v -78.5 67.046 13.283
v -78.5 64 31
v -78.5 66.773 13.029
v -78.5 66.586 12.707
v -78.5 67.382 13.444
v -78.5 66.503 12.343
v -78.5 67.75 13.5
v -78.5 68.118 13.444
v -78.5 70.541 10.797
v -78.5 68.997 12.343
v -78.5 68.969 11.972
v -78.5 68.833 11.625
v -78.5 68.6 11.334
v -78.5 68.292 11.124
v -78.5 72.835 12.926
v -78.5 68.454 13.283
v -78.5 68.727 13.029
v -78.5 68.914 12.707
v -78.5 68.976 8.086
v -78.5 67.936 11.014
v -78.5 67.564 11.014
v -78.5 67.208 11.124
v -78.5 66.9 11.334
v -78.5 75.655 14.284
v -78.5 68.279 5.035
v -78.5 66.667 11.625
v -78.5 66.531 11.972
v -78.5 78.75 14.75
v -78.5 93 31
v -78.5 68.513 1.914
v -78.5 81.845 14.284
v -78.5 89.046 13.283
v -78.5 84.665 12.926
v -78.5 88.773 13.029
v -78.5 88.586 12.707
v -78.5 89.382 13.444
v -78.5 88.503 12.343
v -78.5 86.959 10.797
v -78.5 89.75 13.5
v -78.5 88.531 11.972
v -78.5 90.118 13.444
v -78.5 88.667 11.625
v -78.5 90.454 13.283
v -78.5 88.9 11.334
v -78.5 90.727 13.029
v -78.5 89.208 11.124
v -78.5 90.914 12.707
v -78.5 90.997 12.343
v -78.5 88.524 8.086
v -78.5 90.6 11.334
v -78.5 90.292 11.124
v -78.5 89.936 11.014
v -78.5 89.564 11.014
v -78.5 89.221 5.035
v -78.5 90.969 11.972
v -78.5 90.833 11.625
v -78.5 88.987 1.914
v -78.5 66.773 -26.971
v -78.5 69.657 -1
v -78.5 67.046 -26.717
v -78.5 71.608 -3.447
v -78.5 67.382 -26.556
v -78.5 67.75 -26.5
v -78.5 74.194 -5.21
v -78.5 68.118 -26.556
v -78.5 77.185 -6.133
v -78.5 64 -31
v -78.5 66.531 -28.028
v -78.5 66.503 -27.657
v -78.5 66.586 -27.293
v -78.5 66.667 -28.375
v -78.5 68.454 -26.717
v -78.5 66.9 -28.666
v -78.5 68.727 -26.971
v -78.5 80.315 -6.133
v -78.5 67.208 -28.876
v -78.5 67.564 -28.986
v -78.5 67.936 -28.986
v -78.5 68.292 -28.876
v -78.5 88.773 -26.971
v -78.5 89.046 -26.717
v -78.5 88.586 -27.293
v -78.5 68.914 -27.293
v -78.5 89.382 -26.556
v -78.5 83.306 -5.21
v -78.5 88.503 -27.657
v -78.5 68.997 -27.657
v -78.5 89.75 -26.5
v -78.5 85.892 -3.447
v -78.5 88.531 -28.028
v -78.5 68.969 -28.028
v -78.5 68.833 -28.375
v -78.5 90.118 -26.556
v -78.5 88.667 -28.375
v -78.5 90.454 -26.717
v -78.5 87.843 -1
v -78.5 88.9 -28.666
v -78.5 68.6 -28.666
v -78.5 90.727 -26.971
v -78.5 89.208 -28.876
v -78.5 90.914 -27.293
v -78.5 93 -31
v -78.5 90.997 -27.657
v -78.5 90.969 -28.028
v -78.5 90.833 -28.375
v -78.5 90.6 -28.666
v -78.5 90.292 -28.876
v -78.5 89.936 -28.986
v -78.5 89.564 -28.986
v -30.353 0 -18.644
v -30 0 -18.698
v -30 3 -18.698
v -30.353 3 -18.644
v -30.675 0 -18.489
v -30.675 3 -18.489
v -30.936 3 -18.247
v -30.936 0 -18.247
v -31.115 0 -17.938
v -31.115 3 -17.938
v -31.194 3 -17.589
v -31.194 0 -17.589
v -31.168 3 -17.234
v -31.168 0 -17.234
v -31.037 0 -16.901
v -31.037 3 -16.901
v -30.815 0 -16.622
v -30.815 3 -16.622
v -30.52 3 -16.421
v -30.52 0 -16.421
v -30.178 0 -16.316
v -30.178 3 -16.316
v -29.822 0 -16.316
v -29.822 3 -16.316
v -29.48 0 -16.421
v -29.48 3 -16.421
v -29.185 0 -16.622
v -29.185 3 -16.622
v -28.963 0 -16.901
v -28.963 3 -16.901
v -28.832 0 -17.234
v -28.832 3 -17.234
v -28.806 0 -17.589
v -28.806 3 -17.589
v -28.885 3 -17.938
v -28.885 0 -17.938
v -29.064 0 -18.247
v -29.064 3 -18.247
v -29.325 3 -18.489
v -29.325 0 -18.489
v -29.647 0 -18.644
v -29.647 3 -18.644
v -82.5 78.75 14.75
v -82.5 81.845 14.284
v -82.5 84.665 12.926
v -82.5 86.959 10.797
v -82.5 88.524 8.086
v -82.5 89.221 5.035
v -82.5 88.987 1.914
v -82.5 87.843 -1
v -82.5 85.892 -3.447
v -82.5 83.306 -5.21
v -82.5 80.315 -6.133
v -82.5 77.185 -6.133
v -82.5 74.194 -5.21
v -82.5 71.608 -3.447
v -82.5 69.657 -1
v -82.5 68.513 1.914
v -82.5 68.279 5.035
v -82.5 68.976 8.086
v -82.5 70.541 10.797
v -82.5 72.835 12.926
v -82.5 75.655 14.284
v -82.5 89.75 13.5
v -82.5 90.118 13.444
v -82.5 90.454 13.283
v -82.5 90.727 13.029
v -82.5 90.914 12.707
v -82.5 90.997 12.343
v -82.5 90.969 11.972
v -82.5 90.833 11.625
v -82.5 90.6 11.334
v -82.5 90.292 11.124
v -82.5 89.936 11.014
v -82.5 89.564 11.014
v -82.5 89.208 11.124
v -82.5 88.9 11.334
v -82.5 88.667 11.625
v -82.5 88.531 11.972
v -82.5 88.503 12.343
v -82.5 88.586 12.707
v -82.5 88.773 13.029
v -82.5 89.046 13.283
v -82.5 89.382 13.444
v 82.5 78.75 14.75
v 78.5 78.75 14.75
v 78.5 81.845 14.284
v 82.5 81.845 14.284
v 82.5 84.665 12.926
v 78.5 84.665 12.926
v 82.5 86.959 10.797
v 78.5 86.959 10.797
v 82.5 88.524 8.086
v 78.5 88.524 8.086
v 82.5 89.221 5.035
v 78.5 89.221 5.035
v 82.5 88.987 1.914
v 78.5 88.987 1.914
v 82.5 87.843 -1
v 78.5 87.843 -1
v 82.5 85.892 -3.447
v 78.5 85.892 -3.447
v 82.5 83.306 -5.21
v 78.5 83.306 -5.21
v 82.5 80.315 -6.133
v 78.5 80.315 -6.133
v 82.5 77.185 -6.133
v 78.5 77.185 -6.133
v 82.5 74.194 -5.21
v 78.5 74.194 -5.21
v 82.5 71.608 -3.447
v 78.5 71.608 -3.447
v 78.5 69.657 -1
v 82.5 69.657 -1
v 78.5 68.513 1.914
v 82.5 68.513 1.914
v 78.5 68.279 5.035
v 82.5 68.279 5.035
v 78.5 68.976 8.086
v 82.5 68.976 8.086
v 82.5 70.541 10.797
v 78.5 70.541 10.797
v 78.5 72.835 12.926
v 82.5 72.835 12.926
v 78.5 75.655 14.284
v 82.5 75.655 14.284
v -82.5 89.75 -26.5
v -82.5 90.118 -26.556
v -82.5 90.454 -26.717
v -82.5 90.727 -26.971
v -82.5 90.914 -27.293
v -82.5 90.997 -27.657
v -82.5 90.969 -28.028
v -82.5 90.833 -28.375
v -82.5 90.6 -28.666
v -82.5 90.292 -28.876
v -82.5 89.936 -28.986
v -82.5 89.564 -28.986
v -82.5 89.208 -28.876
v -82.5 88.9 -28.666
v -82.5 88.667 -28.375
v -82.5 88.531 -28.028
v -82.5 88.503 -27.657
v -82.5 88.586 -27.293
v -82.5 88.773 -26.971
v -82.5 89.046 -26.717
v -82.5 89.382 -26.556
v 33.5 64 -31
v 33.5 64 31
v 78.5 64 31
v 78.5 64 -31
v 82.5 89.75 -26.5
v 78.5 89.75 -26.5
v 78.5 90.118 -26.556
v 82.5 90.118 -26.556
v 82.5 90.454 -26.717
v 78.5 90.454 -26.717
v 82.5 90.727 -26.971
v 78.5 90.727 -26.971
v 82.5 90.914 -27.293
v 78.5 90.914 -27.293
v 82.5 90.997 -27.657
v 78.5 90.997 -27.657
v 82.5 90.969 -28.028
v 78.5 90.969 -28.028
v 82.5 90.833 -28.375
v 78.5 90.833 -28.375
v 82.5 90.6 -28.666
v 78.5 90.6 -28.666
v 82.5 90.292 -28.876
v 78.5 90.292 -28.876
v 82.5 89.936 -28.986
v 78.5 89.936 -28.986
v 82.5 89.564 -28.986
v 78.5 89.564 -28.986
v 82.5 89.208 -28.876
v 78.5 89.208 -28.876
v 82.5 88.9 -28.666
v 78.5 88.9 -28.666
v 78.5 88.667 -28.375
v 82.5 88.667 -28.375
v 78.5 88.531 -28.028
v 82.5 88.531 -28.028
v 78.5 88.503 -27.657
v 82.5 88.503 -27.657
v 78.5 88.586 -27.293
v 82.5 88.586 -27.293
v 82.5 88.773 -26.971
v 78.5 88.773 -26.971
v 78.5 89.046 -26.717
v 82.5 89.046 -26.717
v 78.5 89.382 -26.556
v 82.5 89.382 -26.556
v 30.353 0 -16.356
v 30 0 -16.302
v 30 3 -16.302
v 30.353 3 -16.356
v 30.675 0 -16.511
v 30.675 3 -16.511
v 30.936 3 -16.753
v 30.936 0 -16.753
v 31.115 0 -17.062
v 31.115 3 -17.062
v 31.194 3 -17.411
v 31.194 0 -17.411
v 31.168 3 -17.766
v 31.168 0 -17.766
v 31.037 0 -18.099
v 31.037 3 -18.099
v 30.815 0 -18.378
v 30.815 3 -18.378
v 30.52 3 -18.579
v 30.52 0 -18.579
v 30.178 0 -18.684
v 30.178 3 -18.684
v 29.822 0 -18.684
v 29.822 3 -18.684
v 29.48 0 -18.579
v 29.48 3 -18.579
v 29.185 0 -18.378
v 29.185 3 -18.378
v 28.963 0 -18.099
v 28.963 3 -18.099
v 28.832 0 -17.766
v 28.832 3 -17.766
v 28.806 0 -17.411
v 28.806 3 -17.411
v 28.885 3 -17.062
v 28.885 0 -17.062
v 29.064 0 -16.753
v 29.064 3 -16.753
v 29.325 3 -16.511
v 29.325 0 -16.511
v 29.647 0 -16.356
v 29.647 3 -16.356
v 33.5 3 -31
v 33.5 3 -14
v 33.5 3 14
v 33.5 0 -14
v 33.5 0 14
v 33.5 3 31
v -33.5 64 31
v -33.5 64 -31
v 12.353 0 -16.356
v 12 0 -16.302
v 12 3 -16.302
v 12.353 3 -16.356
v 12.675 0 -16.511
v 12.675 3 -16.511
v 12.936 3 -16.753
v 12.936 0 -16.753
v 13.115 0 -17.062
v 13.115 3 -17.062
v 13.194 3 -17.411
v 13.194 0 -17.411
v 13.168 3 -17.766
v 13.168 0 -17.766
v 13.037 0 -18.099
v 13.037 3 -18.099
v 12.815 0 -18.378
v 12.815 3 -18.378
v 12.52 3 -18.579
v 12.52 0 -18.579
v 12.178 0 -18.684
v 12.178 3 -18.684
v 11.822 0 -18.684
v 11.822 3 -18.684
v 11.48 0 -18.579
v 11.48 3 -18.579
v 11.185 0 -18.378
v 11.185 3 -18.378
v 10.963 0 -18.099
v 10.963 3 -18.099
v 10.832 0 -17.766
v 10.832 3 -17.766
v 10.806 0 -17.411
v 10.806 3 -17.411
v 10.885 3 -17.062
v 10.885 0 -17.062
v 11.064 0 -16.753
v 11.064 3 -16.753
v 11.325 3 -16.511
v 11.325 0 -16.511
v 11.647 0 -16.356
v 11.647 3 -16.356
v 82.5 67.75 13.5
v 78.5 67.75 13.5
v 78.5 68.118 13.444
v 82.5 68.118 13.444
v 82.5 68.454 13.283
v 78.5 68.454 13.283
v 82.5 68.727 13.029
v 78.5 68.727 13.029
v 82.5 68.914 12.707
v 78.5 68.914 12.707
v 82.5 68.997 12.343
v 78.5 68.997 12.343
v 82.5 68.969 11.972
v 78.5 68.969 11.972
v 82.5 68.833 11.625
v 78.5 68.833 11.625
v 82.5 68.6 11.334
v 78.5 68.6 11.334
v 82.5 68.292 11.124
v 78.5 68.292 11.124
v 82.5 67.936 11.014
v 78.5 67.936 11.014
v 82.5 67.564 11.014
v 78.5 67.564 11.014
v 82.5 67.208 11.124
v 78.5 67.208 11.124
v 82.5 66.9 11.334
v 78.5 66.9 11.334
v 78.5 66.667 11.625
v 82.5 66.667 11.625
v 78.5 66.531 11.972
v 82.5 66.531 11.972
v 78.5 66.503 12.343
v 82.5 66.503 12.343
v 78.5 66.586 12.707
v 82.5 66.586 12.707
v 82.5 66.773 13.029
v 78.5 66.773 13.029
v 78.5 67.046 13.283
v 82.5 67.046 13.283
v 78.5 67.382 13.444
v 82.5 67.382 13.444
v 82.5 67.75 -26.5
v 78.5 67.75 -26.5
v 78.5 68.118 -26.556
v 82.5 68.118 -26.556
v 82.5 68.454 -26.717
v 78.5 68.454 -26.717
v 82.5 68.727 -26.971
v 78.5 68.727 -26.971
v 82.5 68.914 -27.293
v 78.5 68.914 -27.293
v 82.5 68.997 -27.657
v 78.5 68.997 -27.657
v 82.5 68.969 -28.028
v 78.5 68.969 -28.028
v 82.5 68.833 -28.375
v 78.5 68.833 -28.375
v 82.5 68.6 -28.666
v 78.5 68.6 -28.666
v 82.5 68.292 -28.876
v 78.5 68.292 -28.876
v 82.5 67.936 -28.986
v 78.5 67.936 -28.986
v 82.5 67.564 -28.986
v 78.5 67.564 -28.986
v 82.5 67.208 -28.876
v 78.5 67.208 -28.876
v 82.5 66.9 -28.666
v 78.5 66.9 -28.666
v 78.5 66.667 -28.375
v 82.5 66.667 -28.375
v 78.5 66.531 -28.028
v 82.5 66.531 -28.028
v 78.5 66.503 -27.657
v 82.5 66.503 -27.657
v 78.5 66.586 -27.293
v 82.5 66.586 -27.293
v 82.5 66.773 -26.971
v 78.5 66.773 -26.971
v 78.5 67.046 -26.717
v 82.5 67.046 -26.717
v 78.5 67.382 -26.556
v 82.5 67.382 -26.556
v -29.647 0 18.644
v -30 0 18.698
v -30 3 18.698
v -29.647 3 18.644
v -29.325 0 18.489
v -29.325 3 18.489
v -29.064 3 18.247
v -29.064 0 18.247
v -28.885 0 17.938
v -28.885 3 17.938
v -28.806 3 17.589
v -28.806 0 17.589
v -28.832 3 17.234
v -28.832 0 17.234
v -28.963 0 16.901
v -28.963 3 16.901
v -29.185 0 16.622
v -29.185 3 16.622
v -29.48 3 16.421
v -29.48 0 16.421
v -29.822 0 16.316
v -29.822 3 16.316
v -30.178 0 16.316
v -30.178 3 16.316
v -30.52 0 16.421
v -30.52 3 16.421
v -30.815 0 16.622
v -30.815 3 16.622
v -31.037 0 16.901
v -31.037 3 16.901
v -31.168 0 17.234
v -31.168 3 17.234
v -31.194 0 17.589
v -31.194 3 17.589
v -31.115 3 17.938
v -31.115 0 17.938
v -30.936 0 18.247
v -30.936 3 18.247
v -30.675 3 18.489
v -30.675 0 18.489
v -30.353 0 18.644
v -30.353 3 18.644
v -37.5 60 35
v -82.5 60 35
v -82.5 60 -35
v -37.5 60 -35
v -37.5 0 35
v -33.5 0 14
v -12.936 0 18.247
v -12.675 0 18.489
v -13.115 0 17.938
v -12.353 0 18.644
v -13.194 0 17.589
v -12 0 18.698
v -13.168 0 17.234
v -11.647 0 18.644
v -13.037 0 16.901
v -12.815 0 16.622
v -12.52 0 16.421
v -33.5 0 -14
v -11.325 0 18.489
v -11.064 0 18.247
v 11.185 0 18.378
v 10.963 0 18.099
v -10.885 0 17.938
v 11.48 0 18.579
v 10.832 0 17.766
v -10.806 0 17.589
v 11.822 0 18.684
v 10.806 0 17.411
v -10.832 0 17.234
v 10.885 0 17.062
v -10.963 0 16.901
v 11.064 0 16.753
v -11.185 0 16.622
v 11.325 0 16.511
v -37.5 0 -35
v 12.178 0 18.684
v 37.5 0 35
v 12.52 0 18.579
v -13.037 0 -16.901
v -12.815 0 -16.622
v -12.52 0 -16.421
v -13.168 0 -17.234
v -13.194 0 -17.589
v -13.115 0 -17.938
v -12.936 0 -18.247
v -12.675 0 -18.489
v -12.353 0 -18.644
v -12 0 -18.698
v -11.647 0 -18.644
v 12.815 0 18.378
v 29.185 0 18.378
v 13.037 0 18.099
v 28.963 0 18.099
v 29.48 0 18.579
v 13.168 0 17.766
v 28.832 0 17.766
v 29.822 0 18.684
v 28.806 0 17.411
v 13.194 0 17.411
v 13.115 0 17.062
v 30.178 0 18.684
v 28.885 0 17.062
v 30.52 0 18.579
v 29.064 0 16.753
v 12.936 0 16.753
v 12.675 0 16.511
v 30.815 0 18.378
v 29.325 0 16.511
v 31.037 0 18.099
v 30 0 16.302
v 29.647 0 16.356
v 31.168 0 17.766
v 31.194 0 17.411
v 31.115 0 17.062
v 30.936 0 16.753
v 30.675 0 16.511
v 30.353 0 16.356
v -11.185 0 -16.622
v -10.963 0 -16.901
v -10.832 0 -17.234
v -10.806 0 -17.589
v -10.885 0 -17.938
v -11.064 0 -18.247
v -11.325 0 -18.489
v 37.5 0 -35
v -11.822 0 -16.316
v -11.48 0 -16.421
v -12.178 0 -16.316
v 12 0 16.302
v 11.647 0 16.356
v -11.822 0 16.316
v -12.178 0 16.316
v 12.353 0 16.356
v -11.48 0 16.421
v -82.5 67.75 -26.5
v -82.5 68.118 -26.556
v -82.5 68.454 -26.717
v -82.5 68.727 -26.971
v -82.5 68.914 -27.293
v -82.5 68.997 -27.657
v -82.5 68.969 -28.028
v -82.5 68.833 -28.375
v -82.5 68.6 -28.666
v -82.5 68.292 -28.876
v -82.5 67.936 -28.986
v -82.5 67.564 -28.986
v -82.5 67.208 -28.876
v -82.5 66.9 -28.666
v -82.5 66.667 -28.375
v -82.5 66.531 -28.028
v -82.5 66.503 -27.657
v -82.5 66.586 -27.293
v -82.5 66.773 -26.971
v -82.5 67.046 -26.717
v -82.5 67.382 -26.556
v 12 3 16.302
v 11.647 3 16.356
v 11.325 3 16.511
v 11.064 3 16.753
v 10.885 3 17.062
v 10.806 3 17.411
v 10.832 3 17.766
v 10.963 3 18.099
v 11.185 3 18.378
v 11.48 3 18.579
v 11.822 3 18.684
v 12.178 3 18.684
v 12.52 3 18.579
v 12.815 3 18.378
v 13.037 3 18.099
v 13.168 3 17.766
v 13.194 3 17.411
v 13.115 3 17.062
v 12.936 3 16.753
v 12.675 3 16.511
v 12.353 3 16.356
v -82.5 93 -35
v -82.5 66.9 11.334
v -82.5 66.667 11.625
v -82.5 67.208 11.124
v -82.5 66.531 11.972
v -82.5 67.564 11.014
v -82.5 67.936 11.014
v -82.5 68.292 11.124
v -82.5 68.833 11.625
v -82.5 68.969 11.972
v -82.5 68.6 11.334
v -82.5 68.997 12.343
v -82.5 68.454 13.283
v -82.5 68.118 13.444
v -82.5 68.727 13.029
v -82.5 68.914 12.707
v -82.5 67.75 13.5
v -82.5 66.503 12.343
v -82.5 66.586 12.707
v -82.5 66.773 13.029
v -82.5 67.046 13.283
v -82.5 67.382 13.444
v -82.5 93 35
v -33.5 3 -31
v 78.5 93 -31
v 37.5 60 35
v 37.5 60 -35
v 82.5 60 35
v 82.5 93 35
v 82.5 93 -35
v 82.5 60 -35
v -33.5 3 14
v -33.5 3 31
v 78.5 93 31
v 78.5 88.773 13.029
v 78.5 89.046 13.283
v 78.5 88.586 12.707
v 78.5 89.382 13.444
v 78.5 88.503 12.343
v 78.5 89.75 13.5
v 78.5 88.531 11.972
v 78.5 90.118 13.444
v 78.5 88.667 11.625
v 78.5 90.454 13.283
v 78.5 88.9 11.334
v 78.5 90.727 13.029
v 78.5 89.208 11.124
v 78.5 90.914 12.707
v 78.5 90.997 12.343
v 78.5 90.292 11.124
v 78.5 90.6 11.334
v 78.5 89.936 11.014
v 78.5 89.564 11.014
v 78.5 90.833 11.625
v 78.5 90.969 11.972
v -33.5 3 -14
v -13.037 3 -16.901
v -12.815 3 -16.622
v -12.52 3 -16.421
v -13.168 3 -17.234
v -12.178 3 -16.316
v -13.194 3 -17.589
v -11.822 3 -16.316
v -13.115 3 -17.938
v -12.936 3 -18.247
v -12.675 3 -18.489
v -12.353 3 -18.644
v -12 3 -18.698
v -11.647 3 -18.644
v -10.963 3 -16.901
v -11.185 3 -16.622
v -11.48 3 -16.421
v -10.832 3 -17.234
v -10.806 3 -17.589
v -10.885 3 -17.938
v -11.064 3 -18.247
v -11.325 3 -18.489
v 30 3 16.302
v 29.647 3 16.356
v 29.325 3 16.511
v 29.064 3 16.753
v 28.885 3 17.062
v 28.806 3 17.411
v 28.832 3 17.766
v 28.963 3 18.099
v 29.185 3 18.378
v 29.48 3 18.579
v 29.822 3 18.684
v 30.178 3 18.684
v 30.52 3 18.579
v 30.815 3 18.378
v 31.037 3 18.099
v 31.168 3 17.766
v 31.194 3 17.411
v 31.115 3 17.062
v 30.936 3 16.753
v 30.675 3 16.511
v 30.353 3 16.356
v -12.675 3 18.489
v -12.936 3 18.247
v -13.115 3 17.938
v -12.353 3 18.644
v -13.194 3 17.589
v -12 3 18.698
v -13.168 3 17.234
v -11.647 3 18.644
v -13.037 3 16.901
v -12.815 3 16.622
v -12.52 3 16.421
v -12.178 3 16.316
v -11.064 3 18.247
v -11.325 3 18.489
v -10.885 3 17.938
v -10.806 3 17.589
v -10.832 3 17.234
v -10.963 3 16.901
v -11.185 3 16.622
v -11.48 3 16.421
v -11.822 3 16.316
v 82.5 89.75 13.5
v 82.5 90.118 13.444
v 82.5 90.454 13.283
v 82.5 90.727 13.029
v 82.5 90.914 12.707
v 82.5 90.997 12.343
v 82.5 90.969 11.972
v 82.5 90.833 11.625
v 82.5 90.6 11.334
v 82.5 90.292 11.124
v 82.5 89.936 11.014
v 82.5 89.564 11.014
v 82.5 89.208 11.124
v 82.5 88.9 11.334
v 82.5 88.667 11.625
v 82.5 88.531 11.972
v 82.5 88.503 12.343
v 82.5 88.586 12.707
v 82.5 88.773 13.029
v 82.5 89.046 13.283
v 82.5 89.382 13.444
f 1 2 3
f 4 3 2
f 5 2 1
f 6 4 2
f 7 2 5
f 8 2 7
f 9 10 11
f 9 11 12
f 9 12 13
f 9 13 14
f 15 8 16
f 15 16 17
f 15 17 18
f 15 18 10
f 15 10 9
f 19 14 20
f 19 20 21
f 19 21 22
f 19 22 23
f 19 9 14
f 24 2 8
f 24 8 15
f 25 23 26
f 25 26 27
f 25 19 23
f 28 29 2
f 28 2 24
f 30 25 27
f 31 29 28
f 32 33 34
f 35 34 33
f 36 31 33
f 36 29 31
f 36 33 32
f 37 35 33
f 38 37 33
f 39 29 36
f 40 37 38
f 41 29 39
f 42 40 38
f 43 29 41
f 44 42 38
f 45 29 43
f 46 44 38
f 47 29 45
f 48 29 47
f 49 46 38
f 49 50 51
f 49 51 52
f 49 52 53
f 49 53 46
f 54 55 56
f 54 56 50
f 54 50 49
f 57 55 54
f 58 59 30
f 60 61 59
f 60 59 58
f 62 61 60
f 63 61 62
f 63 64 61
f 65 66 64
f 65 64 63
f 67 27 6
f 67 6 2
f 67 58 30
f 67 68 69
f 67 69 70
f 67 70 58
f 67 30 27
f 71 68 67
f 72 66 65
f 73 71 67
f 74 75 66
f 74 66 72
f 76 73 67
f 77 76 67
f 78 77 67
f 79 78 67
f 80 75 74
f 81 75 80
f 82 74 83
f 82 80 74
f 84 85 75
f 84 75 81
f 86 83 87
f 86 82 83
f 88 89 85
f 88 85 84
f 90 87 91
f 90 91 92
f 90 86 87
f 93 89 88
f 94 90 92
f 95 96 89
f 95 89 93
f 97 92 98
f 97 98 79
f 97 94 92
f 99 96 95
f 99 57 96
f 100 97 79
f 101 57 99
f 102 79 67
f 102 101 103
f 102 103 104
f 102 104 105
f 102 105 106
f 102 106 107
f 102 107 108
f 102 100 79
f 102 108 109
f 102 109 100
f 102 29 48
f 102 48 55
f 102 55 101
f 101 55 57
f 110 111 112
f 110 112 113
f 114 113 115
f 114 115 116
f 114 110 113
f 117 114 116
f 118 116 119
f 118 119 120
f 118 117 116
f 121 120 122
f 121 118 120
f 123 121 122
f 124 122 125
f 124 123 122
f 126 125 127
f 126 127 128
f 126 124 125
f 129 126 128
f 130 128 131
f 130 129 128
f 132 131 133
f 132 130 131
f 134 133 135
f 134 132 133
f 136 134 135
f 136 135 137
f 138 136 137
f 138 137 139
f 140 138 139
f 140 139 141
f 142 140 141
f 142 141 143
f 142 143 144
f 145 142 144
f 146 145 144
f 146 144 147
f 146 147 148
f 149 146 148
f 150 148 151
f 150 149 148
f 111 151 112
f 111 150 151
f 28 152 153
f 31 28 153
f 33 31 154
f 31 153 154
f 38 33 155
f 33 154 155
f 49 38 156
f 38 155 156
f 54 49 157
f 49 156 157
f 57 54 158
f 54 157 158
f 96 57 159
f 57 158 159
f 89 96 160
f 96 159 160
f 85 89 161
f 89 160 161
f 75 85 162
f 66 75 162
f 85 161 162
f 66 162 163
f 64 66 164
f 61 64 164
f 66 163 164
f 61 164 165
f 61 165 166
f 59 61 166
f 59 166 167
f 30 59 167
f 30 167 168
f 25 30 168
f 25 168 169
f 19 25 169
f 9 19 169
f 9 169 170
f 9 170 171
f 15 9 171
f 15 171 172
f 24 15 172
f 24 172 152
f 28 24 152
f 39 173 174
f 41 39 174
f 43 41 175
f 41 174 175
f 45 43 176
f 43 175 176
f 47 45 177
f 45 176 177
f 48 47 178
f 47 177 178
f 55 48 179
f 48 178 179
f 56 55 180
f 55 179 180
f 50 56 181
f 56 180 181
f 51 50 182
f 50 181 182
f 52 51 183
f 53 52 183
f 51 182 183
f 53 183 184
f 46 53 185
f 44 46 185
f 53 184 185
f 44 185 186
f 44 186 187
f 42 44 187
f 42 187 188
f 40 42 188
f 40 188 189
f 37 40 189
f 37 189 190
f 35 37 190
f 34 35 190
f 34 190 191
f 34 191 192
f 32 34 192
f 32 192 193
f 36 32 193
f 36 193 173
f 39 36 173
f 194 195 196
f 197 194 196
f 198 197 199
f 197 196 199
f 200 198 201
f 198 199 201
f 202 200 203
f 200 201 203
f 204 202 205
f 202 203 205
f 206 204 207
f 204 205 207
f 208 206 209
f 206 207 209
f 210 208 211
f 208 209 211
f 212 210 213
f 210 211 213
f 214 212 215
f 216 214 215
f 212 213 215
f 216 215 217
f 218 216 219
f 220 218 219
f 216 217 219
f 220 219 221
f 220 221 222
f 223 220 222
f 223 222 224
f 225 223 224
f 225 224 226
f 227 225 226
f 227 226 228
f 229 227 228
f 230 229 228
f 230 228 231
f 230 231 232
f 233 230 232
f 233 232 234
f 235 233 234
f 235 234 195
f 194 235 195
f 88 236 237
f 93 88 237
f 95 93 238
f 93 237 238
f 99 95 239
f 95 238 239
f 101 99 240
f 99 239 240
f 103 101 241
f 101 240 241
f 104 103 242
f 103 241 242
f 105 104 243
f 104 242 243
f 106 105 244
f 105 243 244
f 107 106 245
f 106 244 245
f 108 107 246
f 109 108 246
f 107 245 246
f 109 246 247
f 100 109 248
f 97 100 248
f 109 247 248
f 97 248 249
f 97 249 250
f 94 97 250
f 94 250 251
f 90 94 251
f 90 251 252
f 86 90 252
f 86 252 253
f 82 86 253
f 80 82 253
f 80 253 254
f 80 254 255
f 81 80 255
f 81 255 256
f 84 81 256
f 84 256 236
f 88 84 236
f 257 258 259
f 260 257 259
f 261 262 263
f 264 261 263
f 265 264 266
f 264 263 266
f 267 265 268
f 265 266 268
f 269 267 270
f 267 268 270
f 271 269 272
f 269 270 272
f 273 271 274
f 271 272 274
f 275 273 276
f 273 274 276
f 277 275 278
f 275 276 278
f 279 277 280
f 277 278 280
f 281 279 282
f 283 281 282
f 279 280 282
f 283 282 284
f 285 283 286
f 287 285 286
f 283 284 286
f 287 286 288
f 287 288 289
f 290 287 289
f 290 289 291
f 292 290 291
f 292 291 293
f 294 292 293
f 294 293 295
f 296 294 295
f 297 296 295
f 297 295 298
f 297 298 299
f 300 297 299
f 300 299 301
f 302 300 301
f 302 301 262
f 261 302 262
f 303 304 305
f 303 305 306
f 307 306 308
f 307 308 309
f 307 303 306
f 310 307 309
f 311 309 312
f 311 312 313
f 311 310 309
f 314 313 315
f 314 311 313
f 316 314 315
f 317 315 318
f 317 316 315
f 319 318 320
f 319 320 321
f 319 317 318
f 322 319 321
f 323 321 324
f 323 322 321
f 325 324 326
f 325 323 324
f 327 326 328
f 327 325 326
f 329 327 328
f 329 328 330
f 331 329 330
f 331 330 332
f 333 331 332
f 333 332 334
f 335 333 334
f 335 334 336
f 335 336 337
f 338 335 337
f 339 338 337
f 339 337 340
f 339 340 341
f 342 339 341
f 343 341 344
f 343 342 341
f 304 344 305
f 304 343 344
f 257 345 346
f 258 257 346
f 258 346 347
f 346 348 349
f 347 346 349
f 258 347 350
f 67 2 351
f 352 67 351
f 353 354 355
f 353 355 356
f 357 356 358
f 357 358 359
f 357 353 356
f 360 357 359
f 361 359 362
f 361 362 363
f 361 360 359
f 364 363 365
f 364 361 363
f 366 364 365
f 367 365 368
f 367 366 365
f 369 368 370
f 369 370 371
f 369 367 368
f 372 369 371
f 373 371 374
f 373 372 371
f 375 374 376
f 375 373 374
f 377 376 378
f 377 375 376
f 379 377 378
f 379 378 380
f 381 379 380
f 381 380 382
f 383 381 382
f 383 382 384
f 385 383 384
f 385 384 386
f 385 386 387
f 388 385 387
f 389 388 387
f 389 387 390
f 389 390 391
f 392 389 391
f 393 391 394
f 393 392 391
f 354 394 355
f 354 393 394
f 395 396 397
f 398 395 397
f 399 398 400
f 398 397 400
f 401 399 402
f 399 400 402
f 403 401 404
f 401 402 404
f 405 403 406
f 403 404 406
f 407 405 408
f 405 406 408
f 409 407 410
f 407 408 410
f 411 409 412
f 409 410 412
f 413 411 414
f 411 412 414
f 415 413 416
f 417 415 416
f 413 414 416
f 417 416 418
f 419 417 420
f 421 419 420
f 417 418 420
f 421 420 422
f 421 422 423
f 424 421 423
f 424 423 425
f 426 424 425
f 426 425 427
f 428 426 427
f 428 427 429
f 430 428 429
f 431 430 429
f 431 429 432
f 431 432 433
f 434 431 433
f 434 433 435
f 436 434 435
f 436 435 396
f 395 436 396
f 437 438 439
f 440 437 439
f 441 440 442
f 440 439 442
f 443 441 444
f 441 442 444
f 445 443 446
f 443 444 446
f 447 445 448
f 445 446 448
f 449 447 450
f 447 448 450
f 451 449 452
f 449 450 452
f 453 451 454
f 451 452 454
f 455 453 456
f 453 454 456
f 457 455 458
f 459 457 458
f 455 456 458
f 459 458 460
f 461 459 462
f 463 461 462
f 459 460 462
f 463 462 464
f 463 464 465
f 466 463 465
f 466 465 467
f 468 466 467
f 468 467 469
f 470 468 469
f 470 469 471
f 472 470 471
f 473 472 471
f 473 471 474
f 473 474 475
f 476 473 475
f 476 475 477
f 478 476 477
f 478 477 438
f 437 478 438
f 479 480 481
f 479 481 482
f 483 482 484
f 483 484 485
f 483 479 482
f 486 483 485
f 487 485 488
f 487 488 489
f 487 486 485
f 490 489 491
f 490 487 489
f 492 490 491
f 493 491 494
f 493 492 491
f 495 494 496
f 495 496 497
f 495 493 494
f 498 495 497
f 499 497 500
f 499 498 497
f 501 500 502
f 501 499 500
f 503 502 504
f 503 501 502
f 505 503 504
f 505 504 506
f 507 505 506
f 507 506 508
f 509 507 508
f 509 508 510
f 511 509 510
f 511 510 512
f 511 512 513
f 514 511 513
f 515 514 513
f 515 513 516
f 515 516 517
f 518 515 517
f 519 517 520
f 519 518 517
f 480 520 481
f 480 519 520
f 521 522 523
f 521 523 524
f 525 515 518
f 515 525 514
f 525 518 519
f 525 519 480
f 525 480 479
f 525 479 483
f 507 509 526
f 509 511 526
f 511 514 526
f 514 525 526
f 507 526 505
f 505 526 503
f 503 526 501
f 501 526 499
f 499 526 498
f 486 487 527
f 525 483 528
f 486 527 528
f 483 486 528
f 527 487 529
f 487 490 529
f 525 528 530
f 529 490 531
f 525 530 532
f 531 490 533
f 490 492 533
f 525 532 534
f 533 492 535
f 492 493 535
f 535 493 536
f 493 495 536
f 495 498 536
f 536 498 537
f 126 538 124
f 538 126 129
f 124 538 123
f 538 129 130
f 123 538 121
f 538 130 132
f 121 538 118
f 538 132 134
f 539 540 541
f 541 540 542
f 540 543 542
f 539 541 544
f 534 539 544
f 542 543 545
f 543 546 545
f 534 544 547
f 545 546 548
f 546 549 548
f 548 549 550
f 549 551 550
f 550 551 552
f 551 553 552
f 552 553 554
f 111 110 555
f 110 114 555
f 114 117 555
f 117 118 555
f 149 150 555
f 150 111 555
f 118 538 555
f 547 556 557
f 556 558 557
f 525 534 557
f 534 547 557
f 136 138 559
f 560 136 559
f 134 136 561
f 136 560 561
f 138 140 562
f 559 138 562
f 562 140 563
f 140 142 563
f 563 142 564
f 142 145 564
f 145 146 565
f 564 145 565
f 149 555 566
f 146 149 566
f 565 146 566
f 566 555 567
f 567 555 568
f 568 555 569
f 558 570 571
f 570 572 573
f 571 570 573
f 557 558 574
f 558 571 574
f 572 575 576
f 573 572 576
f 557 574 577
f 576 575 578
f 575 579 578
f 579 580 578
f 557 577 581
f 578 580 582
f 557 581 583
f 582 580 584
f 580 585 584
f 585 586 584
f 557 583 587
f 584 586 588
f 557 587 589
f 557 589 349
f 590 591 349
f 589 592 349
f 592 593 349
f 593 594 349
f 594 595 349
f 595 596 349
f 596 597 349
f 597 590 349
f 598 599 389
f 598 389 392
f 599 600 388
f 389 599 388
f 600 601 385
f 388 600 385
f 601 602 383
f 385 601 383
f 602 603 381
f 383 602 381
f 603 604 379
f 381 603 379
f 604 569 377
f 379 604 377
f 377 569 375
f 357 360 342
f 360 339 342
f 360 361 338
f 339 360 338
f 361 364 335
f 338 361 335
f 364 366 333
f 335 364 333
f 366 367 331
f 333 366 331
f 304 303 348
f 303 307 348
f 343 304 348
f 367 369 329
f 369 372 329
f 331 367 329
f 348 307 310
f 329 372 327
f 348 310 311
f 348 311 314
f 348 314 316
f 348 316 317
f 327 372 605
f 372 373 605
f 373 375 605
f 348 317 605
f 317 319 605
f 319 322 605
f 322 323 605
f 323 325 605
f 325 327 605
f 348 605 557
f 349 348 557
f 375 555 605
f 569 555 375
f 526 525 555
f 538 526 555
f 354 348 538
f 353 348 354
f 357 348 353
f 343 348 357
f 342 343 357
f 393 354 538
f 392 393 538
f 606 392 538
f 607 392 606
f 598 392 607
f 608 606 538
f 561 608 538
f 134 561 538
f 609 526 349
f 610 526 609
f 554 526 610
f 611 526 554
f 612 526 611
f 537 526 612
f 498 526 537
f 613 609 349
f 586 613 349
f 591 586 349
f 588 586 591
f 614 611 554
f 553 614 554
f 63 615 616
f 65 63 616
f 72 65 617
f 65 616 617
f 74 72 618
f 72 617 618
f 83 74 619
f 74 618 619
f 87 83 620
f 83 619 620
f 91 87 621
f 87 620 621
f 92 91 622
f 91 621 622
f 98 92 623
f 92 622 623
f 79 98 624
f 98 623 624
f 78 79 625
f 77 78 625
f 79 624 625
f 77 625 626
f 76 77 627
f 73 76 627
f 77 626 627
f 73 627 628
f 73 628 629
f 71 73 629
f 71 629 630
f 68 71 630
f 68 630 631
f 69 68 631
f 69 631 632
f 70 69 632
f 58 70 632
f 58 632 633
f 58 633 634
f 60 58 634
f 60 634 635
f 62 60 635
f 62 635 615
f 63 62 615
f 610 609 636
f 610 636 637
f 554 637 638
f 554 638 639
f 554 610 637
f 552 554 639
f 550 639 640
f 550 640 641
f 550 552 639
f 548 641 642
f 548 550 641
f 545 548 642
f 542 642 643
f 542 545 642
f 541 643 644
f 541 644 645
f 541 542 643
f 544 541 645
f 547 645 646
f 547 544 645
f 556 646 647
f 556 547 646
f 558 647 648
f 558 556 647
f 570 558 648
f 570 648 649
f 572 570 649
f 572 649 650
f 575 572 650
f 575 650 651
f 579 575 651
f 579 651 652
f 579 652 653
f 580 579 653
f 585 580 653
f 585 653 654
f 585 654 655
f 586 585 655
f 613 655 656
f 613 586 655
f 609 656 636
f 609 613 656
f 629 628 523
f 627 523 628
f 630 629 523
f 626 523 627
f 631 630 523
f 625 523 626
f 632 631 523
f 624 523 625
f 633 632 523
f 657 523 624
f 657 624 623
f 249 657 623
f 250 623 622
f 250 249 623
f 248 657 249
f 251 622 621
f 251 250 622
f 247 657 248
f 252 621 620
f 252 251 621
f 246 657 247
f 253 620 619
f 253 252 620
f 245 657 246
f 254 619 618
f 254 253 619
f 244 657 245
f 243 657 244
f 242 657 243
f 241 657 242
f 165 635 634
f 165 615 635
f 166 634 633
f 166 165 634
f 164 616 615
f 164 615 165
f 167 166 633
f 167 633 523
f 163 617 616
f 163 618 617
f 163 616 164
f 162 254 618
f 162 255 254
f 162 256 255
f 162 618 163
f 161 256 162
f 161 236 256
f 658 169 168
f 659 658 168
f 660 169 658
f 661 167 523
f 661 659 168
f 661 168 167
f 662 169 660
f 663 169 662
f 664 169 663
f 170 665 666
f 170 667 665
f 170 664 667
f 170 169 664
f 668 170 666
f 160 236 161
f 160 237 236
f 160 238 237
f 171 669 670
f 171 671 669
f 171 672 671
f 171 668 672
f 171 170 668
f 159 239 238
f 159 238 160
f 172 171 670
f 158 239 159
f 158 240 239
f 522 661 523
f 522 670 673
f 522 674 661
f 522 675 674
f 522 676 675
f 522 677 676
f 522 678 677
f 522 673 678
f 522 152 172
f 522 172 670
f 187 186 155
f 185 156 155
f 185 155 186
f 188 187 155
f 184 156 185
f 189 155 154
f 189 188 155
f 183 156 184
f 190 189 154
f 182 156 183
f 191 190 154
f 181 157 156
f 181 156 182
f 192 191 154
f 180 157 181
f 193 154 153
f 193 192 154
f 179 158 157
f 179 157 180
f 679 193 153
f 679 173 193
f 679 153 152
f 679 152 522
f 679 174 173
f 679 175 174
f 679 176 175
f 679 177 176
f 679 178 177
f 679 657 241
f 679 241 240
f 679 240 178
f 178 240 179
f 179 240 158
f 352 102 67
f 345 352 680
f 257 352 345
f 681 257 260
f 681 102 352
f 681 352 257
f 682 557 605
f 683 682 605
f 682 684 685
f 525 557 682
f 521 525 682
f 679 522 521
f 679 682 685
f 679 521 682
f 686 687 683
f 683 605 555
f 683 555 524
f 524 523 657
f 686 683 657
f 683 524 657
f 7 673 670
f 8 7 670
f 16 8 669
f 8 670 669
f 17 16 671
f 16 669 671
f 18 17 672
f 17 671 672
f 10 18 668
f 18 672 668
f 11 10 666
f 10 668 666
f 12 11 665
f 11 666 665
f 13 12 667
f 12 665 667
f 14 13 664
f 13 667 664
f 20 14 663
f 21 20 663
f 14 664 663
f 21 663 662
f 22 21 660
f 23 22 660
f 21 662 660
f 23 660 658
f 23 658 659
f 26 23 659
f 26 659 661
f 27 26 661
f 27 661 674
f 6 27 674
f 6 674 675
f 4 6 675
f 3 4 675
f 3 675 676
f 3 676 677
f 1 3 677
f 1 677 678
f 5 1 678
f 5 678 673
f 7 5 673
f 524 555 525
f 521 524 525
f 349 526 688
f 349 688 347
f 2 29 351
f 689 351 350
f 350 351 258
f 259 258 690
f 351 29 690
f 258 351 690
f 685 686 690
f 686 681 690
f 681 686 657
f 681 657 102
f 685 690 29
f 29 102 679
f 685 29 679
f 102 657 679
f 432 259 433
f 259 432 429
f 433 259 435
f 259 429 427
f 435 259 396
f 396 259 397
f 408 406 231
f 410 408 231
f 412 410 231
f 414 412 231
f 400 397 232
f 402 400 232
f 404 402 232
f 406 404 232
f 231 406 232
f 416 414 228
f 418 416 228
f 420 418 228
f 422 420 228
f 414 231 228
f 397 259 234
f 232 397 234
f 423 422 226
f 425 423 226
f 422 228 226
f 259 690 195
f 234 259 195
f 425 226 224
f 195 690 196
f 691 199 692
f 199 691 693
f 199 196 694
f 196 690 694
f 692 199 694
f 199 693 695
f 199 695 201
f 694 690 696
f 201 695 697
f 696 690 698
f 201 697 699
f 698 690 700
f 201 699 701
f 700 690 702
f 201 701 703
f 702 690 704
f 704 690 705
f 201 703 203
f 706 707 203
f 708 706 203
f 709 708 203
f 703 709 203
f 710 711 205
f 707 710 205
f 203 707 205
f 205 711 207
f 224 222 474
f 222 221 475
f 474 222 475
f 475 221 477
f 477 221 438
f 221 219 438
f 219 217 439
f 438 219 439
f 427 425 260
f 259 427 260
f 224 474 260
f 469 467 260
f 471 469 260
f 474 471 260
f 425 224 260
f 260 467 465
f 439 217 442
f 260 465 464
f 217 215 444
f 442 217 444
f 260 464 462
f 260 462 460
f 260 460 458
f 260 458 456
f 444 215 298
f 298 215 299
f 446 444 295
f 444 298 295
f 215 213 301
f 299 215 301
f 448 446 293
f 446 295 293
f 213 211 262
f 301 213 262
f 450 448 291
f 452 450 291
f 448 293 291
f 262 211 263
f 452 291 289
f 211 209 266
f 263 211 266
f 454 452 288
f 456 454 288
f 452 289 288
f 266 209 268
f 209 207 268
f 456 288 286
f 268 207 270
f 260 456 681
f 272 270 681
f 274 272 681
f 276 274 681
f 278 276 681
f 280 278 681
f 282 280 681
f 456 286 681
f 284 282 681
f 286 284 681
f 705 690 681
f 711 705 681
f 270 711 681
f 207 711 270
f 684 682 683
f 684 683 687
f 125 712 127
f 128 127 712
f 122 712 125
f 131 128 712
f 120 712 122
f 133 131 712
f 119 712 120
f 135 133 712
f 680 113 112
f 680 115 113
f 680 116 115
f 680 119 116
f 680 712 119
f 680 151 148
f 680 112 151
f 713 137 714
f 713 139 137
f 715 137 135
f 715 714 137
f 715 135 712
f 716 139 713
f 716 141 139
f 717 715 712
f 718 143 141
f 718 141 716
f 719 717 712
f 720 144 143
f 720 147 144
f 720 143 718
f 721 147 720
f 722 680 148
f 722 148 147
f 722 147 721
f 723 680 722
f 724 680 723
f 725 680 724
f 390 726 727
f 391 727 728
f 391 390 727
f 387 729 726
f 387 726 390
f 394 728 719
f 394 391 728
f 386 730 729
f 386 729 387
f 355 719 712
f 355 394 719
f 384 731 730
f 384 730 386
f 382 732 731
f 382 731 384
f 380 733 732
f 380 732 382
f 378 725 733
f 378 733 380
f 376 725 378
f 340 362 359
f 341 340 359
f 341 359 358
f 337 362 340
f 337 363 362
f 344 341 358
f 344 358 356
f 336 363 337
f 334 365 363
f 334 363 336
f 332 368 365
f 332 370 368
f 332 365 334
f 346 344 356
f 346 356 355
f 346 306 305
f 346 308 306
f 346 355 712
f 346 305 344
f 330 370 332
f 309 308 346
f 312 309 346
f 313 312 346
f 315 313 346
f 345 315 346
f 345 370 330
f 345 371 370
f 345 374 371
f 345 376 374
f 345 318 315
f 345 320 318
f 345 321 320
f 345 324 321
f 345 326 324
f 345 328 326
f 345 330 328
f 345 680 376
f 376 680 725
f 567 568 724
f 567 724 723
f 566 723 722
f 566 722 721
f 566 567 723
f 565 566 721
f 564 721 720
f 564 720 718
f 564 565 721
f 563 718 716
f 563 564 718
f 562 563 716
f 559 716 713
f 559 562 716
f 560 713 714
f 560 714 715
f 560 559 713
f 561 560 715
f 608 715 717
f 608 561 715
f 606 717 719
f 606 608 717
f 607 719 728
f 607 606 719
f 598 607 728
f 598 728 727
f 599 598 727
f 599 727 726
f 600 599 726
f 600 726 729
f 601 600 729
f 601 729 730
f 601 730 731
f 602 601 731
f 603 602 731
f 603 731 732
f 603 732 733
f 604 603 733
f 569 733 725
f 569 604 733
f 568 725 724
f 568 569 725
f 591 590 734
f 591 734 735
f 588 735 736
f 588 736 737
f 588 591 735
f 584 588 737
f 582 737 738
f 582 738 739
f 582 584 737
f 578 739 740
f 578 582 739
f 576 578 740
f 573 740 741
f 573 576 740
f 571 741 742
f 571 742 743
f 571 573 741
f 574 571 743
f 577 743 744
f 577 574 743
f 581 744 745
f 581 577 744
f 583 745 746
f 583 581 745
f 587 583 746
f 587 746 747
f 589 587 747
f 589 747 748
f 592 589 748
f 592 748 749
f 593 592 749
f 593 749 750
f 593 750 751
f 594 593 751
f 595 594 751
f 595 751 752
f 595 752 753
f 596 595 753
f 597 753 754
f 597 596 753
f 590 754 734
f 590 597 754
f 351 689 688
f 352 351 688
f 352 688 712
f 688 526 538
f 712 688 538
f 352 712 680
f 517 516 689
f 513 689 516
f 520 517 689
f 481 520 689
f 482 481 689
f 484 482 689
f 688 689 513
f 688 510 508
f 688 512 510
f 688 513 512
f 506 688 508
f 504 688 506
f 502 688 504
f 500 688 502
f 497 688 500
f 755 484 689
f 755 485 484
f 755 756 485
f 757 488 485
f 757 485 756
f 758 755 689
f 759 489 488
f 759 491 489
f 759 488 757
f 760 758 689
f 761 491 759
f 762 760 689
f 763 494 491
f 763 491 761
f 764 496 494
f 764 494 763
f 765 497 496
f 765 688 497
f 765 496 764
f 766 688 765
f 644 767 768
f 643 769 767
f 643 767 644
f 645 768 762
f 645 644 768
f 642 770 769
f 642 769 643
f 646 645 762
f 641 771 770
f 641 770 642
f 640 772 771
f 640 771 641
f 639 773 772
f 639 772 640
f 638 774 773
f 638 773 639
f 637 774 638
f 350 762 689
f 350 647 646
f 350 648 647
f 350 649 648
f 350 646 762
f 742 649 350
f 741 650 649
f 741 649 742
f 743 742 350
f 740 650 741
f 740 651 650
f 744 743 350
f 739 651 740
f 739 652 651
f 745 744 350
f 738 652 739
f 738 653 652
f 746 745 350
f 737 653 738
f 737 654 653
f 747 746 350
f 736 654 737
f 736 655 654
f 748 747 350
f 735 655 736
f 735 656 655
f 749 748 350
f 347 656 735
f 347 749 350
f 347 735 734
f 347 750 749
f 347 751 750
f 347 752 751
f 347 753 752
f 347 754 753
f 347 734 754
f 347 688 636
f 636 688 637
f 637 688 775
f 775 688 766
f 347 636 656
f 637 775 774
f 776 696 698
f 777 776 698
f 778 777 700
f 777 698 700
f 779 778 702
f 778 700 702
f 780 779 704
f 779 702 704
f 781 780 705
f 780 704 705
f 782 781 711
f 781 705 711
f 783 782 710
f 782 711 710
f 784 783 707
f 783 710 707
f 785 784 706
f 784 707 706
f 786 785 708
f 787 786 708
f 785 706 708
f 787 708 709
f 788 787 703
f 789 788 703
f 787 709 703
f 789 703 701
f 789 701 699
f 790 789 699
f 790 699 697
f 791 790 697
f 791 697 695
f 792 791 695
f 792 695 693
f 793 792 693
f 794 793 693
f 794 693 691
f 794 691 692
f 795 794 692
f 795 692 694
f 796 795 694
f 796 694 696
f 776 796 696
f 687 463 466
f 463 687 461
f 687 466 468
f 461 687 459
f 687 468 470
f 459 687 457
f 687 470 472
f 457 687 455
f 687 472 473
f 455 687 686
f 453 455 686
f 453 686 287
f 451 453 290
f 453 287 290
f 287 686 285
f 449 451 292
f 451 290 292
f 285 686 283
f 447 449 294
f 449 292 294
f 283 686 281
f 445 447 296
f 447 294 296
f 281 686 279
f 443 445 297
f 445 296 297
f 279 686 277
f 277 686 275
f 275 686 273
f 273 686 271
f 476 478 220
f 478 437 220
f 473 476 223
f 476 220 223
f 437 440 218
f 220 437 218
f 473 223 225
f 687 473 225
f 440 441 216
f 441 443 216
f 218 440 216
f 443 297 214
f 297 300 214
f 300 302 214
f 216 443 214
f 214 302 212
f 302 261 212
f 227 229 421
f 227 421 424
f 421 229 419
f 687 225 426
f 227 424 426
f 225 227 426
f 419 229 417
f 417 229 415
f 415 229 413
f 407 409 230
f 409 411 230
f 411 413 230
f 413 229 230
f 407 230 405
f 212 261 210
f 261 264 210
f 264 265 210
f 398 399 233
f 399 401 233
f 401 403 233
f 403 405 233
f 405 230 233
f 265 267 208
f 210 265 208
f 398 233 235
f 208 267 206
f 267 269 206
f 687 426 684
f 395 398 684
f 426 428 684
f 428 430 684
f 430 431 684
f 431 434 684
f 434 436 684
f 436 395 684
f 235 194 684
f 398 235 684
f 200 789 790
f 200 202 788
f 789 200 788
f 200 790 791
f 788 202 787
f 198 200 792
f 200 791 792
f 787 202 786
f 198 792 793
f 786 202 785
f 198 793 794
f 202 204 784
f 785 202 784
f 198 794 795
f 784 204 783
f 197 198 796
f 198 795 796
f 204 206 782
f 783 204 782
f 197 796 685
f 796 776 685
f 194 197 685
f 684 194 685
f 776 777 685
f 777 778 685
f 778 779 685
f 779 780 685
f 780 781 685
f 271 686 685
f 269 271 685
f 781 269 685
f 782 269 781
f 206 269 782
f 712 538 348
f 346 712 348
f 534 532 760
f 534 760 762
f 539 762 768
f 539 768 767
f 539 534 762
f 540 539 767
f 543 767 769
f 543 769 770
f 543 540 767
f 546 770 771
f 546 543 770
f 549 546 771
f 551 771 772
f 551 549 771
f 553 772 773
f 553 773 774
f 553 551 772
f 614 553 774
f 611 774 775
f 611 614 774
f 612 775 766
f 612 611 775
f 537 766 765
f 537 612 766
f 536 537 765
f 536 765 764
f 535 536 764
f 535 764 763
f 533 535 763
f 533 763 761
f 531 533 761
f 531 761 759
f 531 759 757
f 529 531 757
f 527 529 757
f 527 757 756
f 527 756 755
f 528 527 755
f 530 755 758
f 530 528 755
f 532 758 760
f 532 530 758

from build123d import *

# Parameters (mm, degrees)
SKETCH1_W                = 75
SKETCH1_H                = 40
SKETCH1_R                = 5
SKETCH1_R_2              = 1.7
SKETCH1_R_3              = 1.197563381
SKETCH1_W_2              = 5
SKETCH1_H_2              = 20
BOSS_EXTRUDE1_DEPTH      = 3
CUT_EXTRUDE1_DEPTH       = 43.605750786
CUT_EXTRUDE1_DEPTH_BACK  = 43.605750786
SKETCH2_W                = 67
SKETCH2_H                = 28
BOSS_EXTRUDE3_DEPTH      = 90
BOSS_EXTRUDE3_DEPTH_BACK = 3
SKETCH6_W                = 67
SKETCH6_H                = 11
CUT_EXTRUDE4_DEPTH       = 104.591746776
SKETCH7_W                = 70
SKETCH7_H                = 37
BOSS_EXTRUDE4_DEPTH      = 45
SKETCH8_W                = 45
SKETCH8_H                = 62
CUT_EXTRUDE6_DEPTH       = 29
SKETCH9_R                = 1.25
SKETCH9_R_2              = 10.5
CUT_EXTRUDE8_DEPTH       = 193.611006954
SKETCH11_W               = 45
SKETCH11_H               = 4
CUT_EXTRUDE9_DEPTH       = 143.671826231


with BuildPart() as part:
    # Sketch1 → Boss-Extrude1 (new body)
    with BuildSketch(Plane(origin=(0, 0, 0), x_dir=(1, 0, 0), z_dir=(0, 1, 0))):
        Rectangle(SKETCH1_W, SKETCH1_H)
        with Locations(Location((-21, 0, 0), (0, 0, 270))):
            Circle(SKETCH1_R, mode=Mode.SUBTRACT)
        with Locations(Location((-30, 8.25, 0), (0, 0, 270))):
            Circle(SKETCH1_R_2, mode=Mode.SUBTRACT)
        with Locations(Location((-12, 8.25, 0), (0, 0, 270))):
            Circle(SKETCH1_R_2, mode=Mode.SUBTRACT)
        with Locations(Location((-12, -8.25, 0), (0, 0, 270))):
            Circle(SKETCH1_R_2, mode=Mode.SUBTRACT)
        with Locations(Location((-30, -8.25, 0), (0, 0, 270))):
            Circle(SKETCH1_R_2, mode=Mode.SUBTRACT)
        with Locations(Location((12, 8.25, 0), (0, 0, 90))):
            Circle(SKETCH1_R_2, mode=Mode.SUBTRACT)
        with Locations(Location((12, -8.25, 0), (0, 0, 90))):
            Circle(SKETCH1_R_2, mode=Mode.SUBTRACT)
        with Locations(Location((21, 0, 0), (0, 0, 90))):
            Circle(SKETCH1_R, mode=Mode.SUBTRACT)
        with Locations(Location((30, -8.25, 0), (0, 0, 90))):
            Circle(SKETCH1_R_2, mode=Mode.SUBTRACT)
        with Locations(Location((30, 8.25, 0), (0, 0, 90))):
            Circle(SKETCH1_R_2, mode=Mode.SUBTRACT)
        with Locations(Location((-30, -17.5, 0), (0, 0, 270))):
            Circle(SKETCH1_R_3, mode=Mode.SUBTRACT)
        with Locations(Location((-12, -17.5, 0), (0, 0, 270))):
            Circle(SKETCH1_R_3, mode=Mode.SUBTRACT)
        with Locations(Location((12, -17.5, 0), (0, 0, 90))):
            Circle(SKETCH1_R_3, mode=Mode.SUBTRACT)
        with Locations(Location((30, -17.5, 0), (0, 0, 90))):
            Circle(SKETCH1_R_3, mode=Mode.SUBTRACT)
        with Locations(Location((30, 17.5, 0), (0, 0, 270))):
            Circle(SKETCH1_R_3, mode=Mode.SUBTRACT)
        with Locations(Location((12, 17.5, 0), (0, 0, 270))):
            Circle(SKETCH1_R_3, mode=Mode.SUBTRACT)
        with Locations(Location((-12, 17.5, 0), (0, 0, 90))):
            Circle(SKETCH1_R_3, mode=Mode.SUBTRACT)
        with Locations(Location((-30, 17.5, 0), (0, 0, 90))):
            Circle(SKETCH1_R_3, mode=Mode.SUBTRACT)
        Rectangle(SKETCH1_W_2, SKETCH1_H_2, mode=Mode.SUBTRACT)
    extrude(amount=BOSS_EXTRUDE1_DEPTH)

    # Sketch2 → Cut-Extrude1 (cut, two sides: drawn at the far end of the back side and taken through both)
    with BuildSketch(Plane(origin=(0, 3, 0), x_dir=(1, 0, 0), z_dir=(0, 1, 0)).offset(-CUT_EXTRUDE1_DEPTH_BACK)):
        Rectangle(SKETCH2_W, SKETCH2_H)
    extrude(amount=CUT_EXTRUDE1_DEPTH + CUT_EXTRUDE1_DEPTH_BACK, mode=Mode.SUBTRACT)

    # Sketch3 → Boss-Extrude3 (add, two sides: drawn at the far end of the back side and taken through both)
    with BuildSketch(Plane(origin=(0, 3, 0), x_dir=(1, 0, 0), z_dir=(0, 1, 0)).offset(-BOSS_EXTRUDE3_DEPTH_BACK)):
        Polygon((37.5, -35), (37.5, -20), (33.5, -20), (-33.5, -20), (-37.5, -20), (-37.5, -35), align=None)
        Polygon((33.5, 20), (37.5, 20), (37.5, 35), (-37.5, 35), (-37.5, 20), (-33.5, 20), align=None)
        Polygon((37.5, -20), (37.5, 20), (33.5, 20), (33.5, 14), (33.5, -14), (33.5, -20), align=None)
        Polygon((-33.5, 14), (-33.5, 20), (-37.5, 20), (-37.5, -20), (-33.5, -20), (-33.5, -14), align=None)
    extrude(amount=BOSS_EXTRUDE3_DEPTH + BOSS_EXTRUDE3_DEPTH_BACK)

    # Sketch6 → Cut-Extrude4 (cut, through all)
    with BuildSketch(Plane(origin=(0, 3, 0), x_dir=(1, 0, 0), z_dir=(0, 1, 0))):
        with Locations((0, -25.5)):
            Rectangle(SKETCH6_W, SKETCH6_H)
        with Locations((0, 25.5)):
            Rectangle(SKETCH6_W, SKETCH6_H)
    extrude(amount=CUT_EXTRUDE4_DEPTH, mode=Mode.SUBTRACT)

    # Sketch7 → Boss-Extrude4 (add)
    with BuildSketch(Plane.ZY.offset(37.5)):
        with Locations((0, 74.5)):
            Rectangle(SKETCH7_W, SKETCH7_H)
    boss_extrude4 = extrude(amount=BOSS_EXTRUDE4_DEPTH)

    # Mirror2: Boss-Extrude4 across plane
    add(boss_extrude4.mirror(Plane(origin=(0, 0, 0), x_dir=(0, 0, 1), z_dir=(1, 0, 0))))

    # Sketch8 → Cut-Extrude6 (cut)
    with BuildSketch(Plane(origin=(0, 93, 0), x_dir=(1, 0, 0), z_dir=(0, 1, 0))):
        with Locations((-56, 0)):
            Rectangle(SKETCH8_W, SKETCH8_H)
        with Locations((56, 0)):
            Rectangle(SKETCH8_W, SKETCH8_H)
    extrude(amount=-CUT_EXTRUDE6_DEPTH, mode=Mode.SUBTRACT)

    # Sketch9 → Cut-Extrude8 (cut, through all)
    with BuildSketch(Plane.ZY.offset(82.5)):
        with Locations((-27.75, 89.75)):
            Circle(SKETCH9_R)
        with Locations((-27.75, 67.75)):
            Circle(SKETCH9_R)
        with Locations((4.25, 78.75)):
            Circle(SKETCH9_R_2)
        with Locations((12.25, 67.75)):
            Circle(SKETCH9_R)
        with Locations((12.25, 89.75)):
            Circle(SKETCH9_R)
    extrude(amount=-CUT_EXTRUDE8_DEPTH, mode=Mode.SUBTRACT)

    # Sketch11 → Cut-Extrude9 (cut, through all)
    with BuildSketch(Plane.XY.offset(35)):
        with Locations((-60, 58)):
            Rectangle(SKETCH11_W, SKETCH11_H)
        with Locations((60, 58)):
            Rectangle(SKETCH11_W, SKETCH11_H)
    extrude(amount=-CUT_EXTRUDE9_DEPTH, mode=Mode.SUBTRACT)


solid = part.part
